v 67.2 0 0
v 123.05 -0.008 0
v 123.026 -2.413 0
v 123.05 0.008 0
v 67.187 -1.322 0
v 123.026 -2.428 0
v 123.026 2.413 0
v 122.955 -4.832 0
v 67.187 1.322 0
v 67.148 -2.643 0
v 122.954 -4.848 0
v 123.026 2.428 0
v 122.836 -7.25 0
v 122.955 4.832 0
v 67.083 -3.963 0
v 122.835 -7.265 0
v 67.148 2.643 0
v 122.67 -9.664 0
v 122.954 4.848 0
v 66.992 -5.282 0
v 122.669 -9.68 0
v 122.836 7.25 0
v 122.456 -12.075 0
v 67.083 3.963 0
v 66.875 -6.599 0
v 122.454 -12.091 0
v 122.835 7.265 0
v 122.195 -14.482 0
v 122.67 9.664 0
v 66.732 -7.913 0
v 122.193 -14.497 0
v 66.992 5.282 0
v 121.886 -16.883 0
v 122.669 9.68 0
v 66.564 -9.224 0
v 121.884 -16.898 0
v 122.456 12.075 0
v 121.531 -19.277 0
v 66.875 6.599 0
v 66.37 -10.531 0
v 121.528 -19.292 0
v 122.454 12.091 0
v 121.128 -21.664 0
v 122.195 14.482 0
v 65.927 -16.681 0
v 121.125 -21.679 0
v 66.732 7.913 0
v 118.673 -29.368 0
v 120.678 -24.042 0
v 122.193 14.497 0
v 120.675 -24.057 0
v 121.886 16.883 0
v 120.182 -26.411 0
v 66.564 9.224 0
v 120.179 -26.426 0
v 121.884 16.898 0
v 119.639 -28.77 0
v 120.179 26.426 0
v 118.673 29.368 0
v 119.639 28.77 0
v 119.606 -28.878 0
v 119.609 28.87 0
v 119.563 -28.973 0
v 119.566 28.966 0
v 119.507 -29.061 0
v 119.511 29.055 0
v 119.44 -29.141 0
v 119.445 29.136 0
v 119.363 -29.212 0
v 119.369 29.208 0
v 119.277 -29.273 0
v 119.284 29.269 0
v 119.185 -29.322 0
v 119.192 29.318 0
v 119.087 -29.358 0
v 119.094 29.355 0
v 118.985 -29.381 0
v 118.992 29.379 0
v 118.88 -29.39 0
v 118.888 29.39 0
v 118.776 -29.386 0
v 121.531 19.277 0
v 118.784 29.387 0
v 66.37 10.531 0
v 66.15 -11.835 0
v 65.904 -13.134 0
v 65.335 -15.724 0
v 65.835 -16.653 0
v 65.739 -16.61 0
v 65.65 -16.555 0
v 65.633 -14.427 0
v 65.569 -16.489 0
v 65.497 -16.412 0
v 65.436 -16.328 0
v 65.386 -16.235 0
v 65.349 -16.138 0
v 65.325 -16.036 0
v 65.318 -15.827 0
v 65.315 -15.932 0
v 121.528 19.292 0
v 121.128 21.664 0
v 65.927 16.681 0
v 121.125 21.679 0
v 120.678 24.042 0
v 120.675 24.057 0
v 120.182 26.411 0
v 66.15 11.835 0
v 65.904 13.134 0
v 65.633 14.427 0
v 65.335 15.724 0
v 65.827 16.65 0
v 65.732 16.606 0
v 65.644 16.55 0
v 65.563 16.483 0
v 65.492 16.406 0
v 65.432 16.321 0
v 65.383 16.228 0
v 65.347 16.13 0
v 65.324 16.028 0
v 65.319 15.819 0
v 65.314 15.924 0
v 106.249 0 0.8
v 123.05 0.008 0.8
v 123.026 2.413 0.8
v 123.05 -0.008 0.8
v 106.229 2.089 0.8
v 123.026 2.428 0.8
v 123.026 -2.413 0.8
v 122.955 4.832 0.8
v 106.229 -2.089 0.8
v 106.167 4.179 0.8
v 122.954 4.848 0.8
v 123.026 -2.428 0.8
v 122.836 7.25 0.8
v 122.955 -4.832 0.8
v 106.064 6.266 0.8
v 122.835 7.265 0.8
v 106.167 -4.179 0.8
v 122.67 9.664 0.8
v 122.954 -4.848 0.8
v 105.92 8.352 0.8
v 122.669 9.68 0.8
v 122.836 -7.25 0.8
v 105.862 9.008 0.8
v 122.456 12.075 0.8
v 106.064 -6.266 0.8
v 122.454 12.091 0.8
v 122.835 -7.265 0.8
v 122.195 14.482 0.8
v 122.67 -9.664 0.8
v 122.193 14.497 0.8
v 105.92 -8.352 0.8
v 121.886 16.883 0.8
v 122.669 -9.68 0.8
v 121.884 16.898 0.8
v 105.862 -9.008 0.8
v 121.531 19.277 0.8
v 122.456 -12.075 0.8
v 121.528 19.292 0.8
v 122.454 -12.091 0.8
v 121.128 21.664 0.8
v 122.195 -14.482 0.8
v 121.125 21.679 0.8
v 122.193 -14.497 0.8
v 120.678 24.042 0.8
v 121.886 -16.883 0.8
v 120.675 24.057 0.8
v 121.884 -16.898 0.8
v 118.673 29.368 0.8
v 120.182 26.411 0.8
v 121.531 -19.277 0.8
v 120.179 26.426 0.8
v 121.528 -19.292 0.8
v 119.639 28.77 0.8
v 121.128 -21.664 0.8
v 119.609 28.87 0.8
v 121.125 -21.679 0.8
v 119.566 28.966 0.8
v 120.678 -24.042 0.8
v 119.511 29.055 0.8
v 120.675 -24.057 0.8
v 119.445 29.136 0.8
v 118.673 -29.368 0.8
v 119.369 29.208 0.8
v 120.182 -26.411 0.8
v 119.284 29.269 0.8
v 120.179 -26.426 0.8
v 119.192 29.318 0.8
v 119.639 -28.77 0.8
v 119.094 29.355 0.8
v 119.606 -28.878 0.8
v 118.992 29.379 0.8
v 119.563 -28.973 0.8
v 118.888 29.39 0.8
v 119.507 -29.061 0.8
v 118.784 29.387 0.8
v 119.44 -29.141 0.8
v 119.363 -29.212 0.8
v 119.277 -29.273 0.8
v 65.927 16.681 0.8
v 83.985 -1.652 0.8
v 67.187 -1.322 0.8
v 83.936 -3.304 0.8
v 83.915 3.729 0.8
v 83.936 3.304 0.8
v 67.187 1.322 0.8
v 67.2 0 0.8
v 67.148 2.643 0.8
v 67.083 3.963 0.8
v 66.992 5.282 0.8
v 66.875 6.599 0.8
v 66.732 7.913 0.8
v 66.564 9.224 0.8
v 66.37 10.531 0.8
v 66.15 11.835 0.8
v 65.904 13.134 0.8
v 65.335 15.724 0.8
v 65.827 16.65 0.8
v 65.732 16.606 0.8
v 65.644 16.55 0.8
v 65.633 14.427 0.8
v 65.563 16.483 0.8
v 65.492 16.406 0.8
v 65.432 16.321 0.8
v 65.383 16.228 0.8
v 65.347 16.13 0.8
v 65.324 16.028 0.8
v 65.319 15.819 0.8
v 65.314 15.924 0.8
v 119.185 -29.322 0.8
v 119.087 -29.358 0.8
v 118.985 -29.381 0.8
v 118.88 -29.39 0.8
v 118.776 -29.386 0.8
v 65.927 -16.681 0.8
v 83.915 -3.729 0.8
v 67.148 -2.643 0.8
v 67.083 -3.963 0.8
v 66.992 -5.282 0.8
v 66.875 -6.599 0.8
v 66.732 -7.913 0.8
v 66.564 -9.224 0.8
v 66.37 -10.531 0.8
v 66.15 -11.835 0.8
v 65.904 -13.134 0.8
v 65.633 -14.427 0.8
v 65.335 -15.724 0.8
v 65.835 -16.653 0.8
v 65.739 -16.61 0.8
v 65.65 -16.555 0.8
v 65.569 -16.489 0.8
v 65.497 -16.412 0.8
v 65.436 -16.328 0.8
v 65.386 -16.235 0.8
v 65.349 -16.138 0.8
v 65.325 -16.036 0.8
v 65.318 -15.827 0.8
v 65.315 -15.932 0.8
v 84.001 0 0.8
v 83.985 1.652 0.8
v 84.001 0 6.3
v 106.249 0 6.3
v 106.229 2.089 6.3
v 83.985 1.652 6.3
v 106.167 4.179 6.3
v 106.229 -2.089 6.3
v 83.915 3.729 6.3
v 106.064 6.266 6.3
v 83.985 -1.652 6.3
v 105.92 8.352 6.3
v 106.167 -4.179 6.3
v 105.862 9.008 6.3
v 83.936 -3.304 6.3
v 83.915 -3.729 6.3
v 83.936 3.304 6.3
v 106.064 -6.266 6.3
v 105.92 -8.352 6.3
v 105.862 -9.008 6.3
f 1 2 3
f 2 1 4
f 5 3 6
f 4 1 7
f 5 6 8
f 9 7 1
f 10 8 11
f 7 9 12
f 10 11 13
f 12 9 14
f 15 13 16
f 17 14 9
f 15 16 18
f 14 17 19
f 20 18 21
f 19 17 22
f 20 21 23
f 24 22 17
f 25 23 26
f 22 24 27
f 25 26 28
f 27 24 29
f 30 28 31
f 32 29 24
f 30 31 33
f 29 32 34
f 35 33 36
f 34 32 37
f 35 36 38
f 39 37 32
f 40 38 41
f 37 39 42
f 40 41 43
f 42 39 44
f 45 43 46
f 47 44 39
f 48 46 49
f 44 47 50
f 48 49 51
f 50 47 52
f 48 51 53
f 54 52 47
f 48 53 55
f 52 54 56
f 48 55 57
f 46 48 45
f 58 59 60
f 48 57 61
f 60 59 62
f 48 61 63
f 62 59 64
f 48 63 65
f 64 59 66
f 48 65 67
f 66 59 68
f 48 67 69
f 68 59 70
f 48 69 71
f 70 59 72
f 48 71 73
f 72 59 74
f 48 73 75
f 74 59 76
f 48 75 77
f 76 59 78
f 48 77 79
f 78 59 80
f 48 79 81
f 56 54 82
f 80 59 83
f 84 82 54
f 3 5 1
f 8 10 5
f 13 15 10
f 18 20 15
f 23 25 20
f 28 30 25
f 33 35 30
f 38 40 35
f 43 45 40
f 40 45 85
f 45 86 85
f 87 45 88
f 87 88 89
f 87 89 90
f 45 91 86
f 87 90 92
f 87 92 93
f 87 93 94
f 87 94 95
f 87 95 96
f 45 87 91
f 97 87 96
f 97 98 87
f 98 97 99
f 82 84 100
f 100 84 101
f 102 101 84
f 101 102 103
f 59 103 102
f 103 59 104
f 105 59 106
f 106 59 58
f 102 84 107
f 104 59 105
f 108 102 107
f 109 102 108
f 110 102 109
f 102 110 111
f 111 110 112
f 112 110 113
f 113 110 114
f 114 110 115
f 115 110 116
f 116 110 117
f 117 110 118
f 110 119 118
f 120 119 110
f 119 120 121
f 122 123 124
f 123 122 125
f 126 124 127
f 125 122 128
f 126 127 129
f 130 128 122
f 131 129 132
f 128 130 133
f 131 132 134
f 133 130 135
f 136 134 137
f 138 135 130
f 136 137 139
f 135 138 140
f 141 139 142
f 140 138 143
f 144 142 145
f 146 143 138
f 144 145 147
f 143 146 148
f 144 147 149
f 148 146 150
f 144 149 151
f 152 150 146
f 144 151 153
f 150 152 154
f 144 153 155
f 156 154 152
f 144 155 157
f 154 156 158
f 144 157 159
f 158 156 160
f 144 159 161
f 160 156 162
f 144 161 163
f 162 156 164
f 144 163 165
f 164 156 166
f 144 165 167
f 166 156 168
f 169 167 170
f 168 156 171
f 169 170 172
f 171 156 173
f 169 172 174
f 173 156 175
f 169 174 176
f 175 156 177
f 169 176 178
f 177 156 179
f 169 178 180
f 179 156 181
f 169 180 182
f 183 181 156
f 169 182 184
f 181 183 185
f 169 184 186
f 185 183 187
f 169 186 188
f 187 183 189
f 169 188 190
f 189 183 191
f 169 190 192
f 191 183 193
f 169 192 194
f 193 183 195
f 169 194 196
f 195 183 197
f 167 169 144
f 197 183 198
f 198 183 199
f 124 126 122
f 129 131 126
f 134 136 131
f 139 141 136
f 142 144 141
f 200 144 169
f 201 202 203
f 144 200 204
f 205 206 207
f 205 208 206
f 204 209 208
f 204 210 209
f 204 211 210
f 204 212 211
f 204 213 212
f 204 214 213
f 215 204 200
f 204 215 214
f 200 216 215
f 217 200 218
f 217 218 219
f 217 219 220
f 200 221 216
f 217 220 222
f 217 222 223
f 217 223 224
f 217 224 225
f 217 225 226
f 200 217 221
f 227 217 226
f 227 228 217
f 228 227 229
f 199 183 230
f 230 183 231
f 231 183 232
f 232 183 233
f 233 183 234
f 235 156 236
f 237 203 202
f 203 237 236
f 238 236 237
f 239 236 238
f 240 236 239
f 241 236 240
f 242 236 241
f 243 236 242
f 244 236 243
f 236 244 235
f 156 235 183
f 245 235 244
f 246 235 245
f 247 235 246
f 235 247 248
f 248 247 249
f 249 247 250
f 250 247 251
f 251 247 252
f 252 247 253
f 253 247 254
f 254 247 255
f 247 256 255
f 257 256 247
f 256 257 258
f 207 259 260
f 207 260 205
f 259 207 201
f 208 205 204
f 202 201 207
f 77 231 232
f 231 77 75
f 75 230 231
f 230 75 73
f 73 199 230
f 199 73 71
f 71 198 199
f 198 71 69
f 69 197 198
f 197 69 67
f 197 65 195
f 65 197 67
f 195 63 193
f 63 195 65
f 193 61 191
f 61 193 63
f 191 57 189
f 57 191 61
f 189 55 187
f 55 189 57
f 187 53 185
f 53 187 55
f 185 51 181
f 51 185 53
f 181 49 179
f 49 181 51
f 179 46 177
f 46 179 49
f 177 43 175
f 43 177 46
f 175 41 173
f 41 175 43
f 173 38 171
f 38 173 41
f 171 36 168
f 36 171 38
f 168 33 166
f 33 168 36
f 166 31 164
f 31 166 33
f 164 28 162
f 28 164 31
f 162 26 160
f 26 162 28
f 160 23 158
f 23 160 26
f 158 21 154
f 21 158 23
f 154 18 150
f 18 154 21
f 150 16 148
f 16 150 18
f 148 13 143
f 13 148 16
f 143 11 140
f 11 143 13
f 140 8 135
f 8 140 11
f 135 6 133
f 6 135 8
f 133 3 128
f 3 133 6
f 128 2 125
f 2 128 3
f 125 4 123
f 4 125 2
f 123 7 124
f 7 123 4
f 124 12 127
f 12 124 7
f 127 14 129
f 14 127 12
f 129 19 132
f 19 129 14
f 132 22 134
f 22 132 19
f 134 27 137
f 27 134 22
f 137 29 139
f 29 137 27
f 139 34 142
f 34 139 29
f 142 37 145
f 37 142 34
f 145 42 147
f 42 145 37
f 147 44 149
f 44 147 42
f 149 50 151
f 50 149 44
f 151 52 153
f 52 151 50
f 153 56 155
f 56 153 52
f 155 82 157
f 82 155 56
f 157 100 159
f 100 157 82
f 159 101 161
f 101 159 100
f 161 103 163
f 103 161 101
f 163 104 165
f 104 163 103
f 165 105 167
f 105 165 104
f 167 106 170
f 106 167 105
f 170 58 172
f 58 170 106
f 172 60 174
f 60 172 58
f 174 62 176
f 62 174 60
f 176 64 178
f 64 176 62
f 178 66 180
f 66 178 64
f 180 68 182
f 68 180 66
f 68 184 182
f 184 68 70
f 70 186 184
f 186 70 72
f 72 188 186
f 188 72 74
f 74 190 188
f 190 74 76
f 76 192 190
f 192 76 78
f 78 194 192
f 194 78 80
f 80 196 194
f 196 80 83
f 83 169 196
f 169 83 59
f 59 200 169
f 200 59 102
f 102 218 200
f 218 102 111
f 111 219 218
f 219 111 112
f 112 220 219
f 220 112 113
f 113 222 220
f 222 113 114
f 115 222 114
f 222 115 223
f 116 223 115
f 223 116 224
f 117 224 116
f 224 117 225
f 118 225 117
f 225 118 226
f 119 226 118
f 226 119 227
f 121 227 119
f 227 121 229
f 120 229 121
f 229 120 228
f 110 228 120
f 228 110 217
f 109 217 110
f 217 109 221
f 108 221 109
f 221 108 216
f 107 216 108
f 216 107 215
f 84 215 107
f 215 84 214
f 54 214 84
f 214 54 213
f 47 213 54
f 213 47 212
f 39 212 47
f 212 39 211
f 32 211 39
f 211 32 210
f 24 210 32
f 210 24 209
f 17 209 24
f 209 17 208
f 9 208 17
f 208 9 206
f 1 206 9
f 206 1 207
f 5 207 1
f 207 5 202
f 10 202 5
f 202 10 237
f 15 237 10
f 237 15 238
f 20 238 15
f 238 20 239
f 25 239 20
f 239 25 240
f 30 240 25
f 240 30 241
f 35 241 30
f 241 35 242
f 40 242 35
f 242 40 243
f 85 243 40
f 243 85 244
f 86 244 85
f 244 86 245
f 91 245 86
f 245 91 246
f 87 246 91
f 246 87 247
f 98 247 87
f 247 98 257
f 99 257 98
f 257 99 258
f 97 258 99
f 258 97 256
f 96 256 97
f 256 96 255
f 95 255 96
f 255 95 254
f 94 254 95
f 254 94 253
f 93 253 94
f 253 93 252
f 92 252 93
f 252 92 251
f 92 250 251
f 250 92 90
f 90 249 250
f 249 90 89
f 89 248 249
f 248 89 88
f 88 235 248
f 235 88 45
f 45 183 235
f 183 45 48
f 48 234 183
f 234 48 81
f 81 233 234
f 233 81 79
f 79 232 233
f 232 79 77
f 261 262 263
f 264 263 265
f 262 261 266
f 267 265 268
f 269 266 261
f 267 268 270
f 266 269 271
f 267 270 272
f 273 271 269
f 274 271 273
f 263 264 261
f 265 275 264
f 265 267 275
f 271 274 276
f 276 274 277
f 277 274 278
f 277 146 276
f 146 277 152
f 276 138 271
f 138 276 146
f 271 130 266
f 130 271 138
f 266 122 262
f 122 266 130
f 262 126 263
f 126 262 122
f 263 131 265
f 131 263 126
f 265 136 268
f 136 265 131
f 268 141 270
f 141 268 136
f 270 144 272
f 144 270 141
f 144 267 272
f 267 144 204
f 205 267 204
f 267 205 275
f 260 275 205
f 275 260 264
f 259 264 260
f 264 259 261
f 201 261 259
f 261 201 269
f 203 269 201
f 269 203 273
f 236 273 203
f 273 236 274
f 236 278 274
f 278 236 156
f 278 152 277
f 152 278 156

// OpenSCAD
// Gen-DD — bobbin BASE (bottom flange + hub). Print x12, flange down. Wind 24 AWG x 240 t around
// the hub with the LID glued on (coil_lid.stl). Copper lives ONLY between the flanges (no proud winds).
include <parameters.scad>;
$fn = 48;
module sector_2d(r_in, r_out, ang) {
    polygon([
        for (a = [-ang/2 : ang/24 : ang/2]) [r_in*cos(a), r_in*sin(a)],
        for (a = [ang/2 : -ang/24 : -ang/2]) [r_out*cos(a), r_out*sin(a)]
    ]);
}
module footprint_2d() { offset(r=wall) sector_2d(coil_id_r, coil_od_r, span_deg); }
module hub_2d()       { offset(delta=-coil_core_inset) sector_2d(coil_id_r, coil_od_r, span_deg); }

union() {
    linear_extrude(flange_t) footprint_2d();
    translate([0, 0, flange_t - 0.01]) linear_extrude(former_web + 0.01) hub_2d();
}
